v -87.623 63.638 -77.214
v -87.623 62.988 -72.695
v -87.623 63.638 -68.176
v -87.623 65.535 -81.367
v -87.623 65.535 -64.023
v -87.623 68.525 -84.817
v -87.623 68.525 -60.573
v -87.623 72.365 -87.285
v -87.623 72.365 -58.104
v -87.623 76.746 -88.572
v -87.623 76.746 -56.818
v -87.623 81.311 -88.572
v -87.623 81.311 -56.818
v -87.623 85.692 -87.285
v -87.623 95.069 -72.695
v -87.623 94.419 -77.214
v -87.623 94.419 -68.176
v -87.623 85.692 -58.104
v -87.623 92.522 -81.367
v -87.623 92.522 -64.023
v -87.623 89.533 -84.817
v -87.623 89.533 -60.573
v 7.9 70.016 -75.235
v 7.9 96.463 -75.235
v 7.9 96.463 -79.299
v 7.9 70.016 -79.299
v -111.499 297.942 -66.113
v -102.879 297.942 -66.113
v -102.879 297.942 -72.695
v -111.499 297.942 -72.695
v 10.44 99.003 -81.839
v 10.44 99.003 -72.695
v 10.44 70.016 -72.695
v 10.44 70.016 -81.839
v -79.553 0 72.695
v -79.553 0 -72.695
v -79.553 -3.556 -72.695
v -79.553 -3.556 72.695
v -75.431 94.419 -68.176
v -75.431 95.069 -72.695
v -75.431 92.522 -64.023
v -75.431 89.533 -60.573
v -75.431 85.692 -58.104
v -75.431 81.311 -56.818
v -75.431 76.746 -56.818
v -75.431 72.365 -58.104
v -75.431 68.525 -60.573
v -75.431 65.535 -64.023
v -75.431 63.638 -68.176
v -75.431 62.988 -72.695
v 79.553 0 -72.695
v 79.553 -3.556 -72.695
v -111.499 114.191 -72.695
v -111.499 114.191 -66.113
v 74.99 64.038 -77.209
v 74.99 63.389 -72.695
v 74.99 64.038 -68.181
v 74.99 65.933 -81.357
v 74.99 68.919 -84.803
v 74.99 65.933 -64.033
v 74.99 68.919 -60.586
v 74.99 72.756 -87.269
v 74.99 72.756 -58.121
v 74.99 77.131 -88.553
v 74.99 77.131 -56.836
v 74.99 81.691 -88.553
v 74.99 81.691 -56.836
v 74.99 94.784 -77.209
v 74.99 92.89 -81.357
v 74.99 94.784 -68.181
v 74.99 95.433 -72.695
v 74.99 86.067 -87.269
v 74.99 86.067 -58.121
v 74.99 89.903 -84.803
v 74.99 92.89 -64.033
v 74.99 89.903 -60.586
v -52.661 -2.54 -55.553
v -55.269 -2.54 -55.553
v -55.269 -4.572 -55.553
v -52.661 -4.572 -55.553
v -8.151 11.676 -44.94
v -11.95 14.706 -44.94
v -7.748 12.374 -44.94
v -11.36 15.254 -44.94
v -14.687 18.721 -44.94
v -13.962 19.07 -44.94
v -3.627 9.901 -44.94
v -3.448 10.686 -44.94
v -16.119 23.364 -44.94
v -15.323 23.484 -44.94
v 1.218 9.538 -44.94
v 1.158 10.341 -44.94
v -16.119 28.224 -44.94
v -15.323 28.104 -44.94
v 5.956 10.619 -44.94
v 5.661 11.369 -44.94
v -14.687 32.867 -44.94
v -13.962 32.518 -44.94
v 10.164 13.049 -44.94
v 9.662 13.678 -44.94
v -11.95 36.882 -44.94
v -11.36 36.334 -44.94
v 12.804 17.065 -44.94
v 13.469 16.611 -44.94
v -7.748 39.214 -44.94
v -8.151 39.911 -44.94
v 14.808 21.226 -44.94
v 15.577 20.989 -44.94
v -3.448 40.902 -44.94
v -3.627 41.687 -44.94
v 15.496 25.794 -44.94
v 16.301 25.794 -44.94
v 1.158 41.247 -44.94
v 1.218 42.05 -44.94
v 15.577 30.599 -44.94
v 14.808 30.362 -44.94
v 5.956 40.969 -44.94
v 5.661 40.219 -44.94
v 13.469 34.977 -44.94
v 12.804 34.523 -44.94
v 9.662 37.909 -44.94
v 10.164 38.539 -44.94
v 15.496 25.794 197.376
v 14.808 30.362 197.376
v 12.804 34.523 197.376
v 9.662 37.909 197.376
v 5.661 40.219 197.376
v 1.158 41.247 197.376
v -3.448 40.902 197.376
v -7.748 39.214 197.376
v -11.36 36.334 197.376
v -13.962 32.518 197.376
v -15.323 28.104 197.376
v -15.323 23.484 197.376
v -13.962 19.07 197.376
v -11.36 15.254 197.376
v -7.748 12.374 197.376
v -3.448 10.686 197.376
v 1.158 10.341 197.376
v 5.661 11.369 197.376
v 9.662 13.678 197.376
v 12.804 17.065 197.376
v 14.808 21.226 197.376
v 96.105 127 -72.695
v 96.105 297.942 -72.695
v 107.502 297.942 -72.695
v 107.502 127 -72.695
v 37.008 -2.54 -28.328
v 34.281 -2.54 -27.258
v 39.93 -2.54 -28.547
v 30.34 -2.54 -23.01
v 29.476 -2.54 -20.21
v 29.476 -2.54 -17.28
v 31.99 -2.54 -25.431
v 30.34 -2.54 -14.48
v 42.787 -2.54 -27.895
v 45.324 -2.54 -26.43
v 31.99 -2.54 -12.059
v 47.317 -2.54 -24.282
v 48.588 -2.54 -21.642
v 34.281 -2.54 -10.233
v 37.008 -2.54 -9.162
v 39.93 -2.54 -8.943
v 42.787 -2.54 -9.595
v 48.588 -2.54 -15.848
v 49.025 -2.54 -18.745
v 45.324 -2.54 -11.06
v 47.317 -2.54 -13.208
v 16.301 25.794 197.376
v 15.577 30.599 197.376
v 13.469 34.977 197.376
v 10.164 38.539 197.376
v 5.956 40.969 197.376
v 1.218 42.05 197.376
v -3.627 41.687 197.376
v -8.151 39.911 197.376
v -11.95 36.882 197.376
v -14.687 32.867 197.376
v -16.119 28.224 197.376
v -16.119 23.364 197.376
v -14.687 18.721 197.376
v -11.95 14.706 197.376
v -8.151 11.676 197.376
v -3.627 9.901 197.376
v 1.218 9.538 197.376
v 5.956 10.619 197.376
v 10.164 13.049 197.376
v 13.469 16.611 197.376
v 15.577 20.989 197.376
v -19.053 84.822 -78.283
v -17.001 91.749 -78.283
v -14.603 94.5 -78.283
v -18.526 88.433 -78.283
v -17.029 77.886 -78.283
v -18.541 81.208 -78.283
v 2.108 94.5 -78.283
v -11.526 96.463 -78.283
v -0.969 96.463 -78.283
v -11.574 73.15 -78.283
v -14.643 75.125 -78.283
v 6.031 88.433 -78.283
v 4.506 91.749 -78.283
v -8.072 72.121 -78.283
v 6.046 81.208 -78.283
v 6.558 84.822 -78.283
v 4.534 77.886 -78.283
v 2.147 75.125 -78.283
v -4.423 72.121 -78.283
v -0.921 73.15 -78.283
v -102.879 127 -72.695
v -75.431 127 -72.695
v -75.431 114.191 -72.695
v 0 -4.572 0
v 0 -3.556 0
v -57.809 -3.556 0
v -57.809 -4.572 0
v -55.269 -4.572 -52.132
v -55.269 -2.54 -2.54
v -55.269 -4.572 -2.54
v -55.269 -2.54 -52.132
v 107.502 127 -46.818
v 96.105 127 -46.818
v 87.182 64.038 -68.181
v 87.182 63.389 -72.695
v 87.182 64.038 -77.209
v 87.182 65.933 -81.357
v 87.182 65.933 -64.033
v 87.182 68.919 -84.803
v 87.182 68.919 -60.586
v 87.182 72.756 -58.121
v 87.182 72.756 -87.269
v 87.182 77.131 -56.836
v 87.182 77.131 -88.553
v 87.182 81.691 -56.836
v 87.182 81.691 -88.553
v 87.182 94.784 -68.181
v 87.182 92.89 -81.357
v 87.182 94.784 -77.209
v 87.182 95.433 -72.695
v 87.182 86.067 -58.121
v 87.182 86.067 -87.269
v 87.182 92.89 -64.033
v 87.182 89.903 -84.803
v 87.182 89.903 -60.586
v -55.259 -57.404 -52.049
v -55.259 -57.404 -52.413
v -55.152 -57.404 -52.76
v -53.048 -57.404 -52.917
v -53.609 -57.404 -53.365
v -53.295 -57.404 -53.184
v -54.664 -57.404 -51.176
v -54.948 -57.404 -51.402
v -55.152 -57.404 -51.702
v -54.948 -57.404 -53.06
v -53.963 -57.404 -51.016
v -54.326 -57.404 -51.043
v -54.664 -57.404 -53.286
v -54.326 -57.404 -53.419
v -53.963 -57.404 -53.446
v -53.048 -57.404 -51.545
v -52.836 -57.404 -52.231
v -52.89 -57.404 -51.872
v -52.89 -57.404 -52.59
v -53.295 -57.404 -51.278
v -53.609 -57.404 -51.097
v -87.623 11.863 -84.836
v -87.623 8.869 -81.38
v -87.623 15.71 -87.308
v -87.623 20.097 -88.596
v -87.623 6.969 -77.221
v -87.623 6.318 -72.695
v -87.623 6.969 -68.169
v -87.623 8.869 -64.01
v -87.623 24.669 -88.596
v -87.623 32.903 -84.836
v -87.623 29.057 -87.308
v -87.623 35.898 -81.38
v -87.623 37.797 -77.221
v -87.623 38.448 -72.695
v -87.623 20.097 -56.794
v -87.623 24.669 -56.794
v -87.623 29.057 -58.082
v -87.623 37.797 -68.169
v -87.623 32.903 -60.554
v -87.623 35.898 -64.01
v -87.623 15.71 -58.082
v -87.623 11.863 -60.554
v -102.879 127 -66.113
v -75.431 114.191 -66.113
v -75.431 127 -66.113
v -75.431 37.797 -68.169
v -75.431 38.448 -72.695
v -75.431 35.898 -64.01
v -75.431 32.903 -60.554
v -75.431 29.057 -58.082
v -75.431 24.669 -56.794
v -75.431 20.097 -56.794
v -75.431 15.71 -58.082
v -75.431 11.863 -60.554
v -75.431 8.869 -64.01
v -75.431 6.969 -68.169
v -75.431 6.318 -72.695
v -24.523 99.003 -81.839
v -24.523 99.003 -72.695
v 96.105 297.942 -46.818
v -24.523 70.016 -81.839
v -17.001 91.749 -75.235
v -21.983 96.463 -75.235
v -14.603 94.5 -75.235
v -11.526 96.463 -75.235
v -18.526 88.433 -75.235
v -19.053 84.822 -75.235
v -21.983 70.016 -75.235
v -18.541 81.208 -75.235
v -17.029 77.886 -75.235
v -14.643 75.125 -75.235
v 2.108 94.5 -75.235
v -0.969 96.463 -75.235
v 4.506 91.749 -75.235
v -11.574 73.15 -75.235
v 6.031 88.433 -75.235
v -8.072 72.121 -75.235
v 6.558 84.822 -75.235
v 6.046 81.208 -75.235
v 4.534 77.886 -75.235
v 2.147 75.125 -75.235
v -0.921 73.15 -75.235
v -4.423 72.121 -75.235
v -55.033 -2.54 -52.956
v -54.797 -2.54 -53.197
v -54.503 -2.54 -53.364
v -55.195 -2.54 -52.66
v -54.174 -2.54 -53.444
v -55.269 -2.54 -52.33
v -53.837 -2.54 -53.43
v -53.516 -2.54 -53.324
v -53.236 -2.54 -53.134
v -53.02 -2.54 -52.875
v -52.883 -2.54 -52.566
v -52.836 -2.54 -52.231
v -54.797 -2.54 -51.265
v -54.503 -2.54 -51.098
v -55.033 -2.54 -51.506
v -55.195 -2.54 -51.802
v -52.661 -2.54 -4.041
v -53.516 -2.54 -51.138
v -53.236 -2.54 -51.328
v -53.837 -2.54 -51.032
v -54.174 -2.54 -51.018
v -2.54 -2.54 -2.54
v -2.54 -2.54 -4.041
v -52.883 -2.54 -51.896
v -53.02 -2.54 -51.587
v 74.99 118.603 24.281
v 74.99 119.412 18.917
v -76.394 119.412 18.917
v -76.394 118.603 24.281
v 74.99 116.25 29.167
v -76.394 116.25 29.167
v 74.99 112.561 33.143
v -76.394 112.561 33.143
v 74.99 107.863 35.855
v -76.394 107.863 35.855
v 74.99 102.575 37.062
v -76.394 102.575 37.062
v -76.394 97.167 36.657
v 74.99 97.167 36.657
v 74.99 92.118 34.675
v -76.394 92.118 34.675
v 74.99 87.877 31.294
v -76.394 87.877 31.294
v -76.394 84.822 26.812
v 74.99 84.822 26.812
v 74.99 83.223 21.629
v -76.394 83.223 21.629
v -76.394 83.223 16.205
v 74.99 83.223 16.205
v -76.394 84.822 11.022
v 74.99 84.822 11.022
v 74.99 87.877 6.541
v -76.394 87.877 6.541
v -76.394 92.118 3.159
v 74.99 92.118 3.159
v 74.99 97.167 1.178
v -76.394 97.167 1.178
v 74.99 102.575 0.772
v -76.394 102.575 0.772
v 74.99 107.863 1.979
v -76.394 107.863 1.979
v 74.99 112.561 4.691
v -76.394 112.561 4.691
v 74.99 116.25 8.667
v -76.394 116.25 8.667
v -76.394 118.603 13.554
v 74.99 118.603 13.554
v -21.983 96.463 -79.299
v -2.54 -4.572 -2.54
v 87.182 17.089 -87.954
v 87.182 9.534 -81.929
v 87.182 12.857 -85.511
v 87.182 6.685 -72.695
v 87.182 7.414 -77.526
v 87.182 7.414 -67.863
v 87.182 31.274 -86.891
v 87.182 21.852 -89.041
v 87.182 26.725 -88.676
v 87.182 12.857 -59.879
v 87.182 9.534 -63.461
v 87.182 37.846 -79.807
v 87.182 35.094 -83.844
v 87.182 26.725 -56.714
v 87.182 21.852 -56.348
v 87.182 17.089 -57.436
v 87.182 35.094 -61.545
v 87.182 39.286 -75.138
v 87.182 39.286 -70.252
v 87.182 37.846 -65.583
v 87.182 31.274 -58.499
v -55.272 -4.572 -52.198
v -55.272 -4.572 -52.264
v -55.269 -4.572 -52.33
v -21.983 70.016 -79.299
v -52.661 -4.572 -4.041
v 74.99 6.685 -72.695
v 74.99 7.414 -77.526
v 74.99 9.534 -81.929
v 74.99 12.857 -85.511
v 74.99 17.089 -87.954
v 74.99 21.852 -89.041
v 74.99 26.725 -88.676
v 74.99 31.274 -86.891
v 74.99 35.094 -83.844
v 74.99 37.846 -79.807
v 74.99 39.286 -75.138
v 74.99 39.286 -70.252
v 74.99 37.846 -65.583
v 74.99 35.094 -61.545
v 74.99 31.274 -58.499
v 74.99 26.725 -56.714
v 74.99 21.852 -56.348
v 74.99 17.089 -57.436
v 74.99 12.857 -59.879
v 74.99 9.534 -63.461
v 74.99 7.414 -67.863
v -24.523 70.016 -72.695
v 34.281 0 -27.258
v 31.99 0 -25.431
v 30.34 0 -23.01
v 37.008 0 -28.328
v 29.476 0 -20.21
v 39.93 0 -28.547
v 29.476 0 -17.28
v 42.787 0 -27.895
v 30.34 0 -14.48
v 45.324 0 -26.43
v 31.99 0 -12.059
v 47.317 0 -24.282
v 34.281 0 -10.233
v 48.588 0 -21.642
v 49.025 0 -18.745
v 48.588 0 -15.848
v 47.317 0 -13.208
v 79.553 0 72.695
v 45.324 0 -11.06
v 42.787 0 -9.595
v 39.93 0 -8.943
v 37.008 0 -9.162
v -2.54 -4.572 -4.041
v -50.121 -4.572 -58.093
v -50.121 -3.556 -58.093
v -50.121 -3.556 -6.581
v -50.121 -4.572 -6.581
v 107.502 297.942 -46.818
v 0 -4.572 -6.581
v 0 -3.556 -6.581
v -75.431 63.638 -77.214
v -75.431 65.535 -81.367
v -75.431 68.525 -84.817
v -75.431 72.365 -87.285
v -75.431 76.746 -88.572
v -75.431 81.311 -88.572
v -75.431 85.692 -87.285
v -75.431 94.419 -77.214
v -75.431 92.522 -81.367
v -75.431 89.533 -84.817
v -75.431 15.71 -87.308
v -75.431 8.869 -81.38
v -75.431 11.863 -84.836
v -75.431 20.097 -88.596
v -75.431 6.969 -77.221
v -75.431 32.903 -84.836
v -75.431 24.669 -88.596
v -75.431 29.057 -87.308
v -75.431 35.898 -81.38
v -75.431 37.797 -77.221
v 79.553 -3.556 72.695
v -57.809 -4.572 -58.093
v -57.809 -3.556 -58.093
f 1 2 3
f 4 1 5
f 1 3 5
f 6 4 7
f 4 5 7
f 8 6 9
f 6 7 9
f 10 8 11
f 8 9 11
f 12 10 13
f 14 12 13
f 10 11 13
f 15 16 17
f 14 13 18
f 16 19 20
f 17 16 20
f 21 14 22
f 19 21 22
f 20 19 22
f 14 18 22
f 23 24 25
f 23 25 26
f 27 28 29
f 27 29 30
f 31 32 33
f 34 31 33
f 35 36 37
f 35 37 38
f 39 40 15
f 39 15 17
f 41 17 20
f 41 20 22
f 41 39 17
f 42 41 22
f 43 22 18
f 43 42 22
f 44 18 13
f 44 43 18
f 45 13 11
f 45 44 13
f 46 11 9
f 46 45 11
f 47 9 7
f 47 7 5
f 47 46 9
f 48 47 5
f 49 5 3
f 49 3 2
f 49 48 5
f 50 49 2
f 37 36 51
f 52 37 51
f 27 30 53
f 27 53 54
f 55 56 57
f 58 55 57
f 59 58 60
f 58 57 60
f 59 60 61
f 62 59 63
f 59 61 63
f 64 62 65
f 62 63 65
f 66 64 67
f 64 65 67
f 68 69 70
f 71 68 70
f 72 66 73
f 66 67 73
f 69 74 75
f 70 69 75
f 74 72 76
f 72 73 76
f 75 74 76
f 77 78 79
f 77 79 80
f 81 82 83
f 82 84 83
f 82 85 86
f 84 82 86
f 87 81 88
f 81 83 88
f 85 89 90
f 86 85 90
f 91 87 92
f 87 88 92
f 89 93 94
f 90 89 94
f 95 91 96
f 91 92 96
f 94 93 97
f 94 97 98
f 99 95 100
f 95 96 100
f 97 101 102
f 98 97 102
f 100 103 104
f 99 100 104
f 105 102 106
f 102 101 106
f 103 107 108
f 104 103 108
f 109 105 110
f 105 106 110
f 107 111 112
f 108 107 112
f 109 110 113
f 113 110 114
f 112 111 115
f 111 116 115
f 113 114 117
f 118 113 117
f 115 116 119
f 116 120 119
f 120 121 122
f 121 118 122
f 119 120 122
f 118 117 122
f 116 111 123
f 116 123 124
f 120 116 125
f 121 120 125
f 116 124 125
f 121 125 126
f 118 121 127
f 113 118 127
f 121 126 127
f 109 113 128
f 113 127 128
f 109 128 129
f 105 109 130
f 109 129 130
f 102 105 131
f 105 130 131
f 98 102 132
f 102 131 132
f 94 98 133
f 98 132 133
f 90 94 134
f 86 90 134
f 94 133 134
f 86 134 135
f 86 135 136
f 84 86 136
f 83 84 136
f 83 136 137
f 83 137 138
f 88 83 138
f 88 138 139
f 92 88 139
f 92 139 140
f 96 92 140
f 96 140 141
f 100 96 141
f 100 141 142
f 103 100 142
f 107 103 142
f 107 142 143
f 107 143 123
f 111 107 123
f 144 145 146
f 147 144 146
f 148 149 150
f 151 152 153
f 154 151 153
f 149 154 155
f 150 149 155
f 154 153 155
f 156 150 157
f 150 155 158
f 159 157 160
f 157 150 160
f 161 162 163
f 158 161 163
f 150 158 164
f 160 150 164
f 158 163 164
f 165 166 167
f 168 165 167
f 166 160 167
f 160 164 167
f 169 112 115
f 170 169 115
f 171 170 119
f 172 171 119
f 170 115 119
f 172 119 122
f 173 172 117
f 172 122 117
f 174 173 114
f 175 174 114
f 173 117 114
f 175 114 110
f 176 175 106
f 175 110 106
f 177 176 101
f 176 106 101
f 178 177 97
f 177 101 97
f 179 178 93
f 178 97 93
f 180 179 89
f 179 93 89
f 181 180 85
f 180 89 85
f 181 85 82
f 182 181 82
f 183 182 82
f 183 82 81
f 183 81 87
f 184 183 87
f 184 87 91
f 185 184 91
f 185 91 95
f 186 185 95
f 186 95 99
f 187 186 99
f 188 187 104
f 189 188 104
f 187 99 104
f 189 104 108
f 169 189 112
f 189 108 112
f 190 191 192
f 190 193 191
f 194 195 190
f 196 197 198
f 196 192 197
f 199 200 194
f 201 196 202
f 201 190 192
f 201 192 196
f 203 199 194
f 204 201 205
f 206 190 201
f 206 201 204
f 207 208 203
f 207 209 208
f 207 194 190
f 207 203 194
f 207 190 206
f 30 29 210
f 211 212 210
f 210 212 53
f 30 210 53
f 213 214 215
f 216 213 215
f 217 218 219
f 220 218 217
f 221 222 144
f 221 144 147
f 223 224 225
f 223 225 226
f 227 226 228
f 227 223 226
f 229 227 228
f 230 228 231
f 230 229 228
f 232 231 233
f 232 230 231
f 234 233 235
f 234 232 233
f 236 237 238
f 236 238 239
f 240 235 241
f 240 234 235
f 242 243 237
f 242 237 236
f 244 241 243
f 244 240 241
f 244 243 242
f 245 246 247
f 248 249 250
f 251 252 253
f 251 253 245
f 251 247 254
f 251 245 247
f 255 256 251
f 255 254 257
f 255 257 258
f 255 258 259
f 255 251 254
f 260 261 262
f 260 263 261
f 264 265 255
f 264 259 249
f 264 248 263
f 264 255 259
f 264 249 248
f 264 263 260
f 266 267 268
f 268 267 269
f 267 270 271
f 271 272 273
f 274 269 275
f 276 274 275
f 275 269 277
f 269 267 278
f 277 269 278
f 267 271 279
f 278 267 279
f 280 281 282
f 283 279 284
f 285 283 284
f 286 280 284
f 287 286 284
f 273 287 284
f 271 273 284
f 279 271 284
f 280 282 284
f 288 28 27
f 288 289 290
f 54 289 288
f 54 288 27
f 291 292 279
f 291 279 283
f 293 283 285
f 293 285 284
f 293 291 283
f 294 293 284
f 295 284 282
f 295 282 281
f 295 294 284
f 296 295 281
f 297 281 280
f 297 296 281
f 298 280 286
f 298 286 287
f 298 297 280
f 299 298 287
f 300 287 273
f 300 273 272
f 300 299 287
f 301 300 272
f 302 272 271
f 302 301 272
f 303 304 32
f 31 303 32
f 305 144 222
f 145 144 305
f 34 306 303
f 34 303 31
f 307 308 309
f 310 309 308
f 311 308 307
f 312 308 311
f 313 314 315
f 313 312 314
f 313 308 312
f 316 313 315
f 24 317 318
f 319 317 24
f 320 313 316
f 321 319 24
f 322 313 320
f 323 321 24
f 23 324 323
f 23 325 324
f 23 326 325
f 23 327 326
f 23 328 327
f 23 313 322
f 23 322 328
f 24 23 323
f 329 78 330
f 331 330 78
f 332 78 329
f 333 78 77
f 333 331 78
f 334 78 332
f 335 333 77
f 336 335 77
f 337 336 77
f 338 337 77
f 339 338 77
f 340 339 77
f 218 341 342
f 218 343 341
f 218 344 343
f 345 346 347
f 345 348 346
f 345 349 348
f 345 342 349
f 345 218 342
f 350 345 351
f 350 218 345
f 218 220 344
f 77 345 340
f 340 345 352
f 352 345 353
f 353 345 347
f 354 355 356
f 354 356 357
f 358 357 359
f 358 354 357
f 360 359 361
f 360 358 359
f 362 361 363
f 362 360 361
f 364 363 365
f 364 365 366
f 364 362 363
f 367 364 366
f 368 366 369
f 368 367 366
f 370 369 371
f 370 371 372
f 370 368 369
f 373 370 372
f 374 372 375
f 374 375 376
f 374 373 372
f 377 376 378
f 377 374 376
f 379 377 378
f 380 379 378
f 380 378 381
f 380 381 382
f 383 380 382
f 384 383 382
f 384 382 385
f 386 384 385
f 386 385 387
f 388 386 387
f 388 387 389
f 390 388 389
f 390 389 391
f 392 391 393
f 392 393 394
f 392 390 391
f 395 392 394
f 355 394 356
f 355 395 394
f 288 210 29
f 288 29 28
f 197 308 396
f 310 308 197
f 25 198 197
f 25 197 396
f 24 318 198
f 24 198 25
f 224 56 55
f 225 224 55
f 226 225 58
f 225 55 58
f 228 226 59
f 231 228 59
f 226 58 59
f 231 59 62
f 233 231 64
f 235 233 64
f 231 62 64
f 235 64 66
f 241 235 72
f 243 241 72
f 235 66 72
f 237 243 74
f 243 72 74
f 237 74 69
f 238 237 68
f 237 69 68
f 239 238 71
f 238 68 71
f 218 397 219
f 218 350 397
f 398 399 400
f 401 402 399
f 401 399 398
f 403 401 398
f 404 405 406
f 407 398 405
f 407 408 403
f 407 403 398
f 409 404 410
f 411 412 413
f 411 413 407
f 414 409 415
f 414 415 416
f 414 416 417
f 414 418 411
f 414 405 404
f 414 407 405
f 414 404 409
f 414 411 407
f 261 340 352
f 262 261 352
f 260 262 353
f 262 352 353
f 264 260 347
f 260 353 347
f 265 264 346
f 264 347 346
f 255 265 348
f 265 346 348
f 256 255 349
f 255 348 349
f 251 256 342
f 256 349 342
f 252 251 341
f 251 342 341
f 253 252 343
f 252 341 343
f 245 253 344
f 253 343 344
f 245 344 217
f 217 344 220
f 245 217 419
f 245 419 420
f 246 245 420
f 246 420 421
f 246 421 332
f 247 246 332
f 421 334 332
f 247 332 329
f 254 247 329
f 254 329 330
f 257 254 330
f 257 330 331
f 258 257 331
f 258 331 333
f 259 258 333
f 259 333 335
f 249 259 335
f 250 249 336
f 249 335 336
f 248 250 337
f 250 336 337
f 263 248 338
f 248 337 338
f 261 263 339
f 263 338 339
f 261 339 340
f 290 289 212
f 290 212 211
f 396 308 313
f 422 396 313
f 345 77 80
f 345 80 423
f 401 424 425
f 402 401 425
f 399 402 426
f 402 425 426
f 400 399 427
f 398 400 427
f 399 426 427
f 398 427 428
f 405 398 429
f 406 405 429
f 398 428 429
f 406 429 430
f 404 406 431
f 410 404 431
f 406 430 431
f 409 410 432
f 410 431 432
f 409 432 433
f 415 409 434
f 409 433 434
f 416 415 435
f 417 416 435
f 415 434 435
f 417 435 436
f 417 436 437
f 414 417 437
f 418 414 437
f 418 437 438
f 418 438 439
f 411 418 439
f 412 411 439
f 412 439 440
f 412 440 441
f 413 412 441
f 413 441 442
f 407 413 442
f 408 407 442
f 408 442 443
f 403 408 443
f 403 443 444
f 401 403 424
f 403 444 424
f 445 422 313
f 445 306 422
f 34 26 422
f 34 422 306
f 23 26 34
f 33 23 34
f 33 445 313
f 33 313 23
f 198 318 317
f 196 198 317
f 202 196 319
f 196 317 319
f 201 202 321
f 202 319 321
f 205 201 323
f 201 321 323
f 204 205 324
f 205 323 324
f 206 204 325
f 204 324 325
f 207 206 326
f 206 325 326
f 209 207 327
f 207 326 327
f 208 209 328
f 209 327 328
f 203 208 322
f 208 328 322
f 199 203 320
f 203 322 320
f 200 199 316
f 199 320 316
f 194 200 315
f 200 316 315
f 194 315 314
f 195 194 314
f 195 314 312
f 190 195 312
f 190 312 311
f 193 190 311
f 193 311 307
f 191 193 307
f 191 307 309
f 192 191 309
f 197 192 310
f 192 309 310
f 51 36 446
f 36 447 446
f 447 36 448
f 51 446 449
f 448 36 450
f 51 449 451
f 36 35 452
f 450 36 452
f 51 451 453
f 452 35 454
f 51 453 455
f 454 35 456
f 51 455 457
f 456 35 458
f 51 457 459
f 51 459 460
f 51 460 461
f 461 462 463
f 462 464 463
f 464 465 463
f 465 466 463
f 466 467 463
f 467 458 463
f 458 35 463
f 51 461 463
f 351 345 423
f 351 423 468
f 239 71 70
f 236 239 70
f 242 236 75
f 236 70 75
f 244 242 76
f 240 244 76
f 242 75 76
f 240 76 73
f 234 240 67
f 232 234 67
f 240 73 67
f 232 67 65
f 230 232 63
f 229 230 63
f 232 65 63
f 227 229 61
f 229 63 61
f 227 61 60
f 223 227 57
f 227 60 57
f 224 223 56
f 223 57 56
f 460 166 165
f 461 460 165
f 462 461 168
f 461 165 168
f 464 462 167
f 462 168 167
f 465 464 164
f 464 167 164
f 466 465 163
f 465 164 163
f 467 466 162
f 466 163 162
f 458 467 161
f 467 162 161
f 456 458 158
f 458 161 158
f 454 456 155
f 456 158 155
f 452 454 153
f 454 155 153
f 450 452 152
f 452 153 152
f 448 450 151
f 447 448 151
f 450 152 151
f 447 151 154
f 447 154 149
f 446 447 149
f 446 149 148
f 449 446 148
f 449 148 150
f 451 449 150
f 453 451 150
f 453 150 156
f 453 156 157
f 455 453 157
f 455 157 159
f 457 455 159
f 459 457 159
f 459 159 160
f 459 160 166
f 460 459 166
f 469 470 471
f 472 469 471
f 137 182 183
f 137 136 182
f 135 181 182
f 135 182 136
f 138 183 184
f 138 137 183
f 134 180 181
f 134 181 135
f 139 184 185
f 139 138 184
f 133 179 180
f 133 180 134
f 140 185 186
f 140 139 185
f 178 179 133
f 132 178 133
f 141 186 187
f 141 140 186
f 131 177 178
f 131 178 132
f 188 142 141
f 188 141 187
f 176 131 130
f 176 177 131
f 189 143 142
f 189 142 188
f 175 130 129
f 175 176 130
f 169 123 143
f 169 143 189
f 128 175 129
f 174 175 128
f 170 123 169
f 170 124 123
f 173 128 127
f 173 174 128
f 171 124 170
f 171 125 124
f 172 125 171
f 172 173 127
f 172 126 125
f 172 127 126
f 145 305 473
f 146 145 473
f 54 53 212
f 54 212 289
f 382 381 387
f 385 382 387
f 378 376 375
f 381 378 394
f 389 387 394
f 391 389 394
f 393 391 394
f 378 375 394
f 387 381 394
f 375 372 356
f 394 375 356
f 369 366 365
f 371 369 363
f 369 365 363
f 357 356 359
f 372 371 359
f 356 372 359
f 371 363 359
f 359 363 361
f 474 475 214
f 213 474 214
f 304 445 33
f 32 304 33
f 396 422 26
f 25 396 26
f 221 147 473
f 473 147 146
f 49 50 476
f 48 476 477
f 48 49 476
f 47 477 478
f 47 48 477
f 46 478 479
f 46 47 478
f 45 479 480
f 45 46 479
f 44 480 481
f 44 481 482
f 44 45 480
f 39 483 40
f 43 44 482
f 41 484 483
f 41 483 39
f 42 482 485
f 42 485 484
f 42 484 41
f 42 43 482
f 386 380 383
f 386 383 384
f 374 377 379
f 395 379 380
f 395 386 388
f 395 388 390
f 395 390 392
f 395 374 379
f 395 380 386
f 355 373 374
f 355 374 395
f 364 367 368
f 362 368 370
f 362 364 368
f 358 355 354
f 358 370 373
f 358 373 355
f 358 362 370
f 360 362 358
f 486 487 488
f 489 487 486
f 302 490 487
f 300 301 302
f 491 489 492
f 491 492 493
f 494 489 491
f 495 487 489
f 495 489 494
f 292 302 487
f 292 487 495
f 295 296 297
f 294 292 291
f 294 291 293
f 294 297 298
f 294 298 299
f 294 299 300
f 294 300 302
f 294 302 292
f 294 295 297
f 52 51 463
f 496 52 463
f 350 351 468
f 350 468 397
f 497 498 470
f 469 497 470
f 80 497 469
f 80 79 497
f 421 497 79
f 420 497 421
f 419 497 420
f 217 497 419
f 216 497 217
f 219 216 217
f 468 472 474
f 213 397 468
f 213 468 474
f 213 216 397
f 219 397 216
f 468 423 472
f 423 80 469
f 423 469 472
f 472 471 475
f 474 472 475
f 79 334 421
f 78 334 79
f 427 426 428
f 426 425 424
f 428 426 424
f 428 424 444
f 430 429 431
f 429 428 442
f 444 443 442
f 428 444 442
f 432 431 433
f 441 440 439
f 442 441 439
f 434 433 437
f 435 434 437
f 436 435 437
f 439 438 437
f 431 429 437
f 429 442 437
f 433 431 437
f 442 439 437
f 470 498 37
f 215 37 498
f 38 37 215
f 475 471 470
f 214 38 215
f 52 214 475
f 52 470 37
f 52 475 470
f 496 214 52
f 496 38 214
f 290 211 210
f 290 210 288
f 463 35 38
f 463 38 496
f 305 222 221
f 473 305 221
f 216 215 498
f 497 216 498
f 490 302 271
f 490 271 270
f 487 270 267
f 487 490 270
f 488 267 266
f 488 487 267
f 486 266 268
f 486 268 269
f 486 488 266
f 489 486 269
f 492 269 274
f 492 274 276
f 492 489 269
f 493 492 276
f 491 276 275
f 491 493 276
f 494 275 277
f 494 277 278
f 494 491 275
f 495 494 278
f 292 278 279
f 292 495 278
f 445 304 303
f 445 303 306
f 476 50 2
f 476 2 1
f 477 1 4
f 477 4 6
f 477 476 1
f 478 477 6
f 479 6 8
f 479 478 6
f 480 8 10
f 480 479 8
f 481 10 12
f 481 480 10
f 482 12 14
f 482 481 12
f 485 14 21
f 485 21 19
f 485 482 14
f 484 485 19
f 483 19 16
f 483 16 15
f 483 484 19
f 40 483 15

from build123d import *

# Parameters (mm, degrees)
F0_W      = 159.1055989265
F0_H      = 145.3896015882
F1_DEPTH  = 3.556
F6_R      = 18.1959049568
F7_DEPTH  = 151.384
F13_W     = 12.8093321323
F13_H     = 6.5816342831
F14_DEPTH = 36.068
F15_W     = 8.6199865751
F15_H     = 6.5816342831
F16_DEPTH = 170.942
F18_R     = 9.8295044078
F19_DEPTH = 25.4
F20_R     = 9.9402572171
F21_DEPTH = 1.016
F24_W     = 11.3966075535
F24_H     = 6.826877594
F25_DEPTH = 170.942
F26_R     = 16.3014838399
F27_DEPTH = 242.316
F28_R     = 15.4963138216
F29_DEPTH = 245.872
F31_DEPTH = 12.192
F33_DEPTH = 12.192
F34_W     = 34.9631672725
F34_H     = 28.9866179228
F35_DEPTH = 9.144
F36_T     = -2.54
F37_R     = 12.8059007853
F38_DEPTH = 3.048
F39_W     = 11.3966075535
F39_H     = 170.942
F40_DEPTH = 19.05
F43_W     = 50.1206144691
F43_H     = 6.5812724642
F44_DEPTH = 1.016
F45_T     = -2.54
F46_R     = 1.2184903026
F47_DEPTH = 54.864


# Not quite as in the source:
# - the program builds the solid bodies; features that only make, move or delete a surface that nothing else refers to are left out


with BuildPart() as f1:
    # F0 (on Front) → F1 (new body)
    with BuildSketch(Plane.XZ):
        Rectangle(F0_W, F0_H)
    extrude(amount=F1_DEPTH)

    # F18 (on face) → F19 (cut)
    with BuildSketch(Plane.XZ.offset(3.556)):
        with Locations((39.1956530511, -18.7452007085)):
            Circle(F18_R)
    extrude(amount=-F19_DEPTH, mode=Mode.SUBTRACT)

    # F20 (on face) → F21 (join)
    with BuildSketch(Plane.XZ.offset(3.556)):
        with Locations((39.1956530511, -18.7452007085)):
            Circle(F20_R)
    extrude(amount=-F21_DEPTH)

    # F43 (on face) → F44 (join)
    with BuildSketch(Plane.XZ.offset(3.556)):
        Polygon((-57.8088574111, 0), (-57.8088574111, -58.0925121903), (-50.1206144691, -58.0925121903), (-50.1206144691, -6.5812724642), (-50.1206144691, 0), align=None)
        with Locations((-25.0603072345, -3.2906362321)):
            Rectangle(F43_W, F43_H)
    extrude(amount=F44_DEPTH)

    # F45
    f45_openings = [f1.faces().sort_by_distance(p)[0] for p in [
        (-56.989309, -4.572, -29.046256),
    ]]
    offset(amount=F45_T, openings=f45_openings, kind=Kind.INTERSECTION)

    # F46 (on face) → F47 (join)
    with BuildSketch(Plane.XZ.offset(2.54)):
        with Locations((-54.0543831885, -52.2309578955)):
            Circle(F46_R)
    extrude(amount=F47_DEPTH)


with BuildPart() as f7:
    # F6 (on face) → F7 (new body)
    with BuildSketch(Plane.YZ.offset(74.9896243215)):
        with Locations((101.2156382203, 18.9172420651)):
            Circle(F6_R)
    extrude(amount=-F7_DEPTH)


with BuildPart() as f14:
    # F13 (on face) → F14 (new body)
    with BuildSketch(Plane.YZ.offset(-75.4310935736)):
        with Locations((120.5953339338, -69.4039836526)):
            Rectangle(F13_W, F13_H)
    extrude(amount=-F14_DEPTH)

    # F15 (on face) → F16 (join)
    with BuildSketch(Plane(origin=(0, 127, 0), x_dir=(-1, 0, 0), z_dir=(0, 1, 0))):
        with Locations((107.189100286, -69.4039836526)):
            Rectangle(F15_W, F15_H)
    extrude(amount=F16_DEPTH)


with BuildPart() as f25:
    # F24 (on face) → F25 (new body)
    with BuildSketch(Plane.XZ.offset(-127)):
        with Locations((101.8033205447, -69.2813619971)):
            Rectangle(F24_W, F24_H)
    extrude(amount=-F25_DEPTH)

    # F39 (on face) → F40 (join)
    with BuildSketch(Plane.XY.offset(-65.8679232001)):
        with Locations((101.8033205447, 212.471)):
            Rectangle(F39_W, F39_H)
    extrude(amount=F40_DEPTH)


with BuildPart() as f27:
    # F26 (on face) → F27 (new body)
    with BuildSketch(Plane.XY.offset(-44.9399761856)):
        with Locations((0, 25.7939305156)):
            Circle(F26_R)
    extrude(amount=F27_DEPTH)

    # F28 (on face) → F29 (cut)
    with BuildSketch(Plane.XY.offset(197.3760238144)):
        with Locations((0, 25.7939305156)):
            Circle(F28_R)
    extrude(amount=-F29_DEPTH, mode=Mode.SUBTRACT)


with BuildPart() as f31:
    # F30 (on face) → F31 (new body)
    with BuildSketch(Plane.YZ.offset(-75.4310935736)):
        with BuildLine():
            ThreePointArc((95.0685632255, -72.6948007941), (79.0285095572, -56.6547471259), (62.988455889, -72.6948007941))
            Line((62.988455889, -72.6948007941), (95.0685632255, -72.6948007941))
        make_face()
        with BuildLine():
            Line((95.0685632255, -72.6948007941), (62.988455889, -72.6948007941))
            ThreePointArc((62.988455889, -72.6948007941), (79.0285095572, -88.7348544623), (95.0685632255, -72.6948007941))
        make_face()
    extrude(amount=-F31_DEPTH)


with BuildPart() as f31b:
    # F30 (on face) → F31, piece 2 (new body)
    with BuildSketch(Plane.YZ.offset(-75.4310935736)):
        with BuildLine():
            Line((6.31843889, -72.6948007941), (38.4480318999, -72.6948007941))
            ThreePointArc((38.4480318999, -72.6948007941), (22.383235395, -56.6300042891), (6.31843889, -72.6948007941))
        make_face()
        with BuildLine():
            ThreePointArc((6.31843889, -72.6948007941), (22.383235395, -88.7595972991), (38.4480318999, -72.6948007941))
            Line((38.4480318999, -72.6948007941), (6.31843889, -72.6948007941))
        make_face()
    extrude(amount=-F31_DEPTH)


with BuildPart() as f33:
    # F32 (on face) → F33 (new body)
    with BuildSketch(Plane.YZ.offset(74.9896243215)):
        with BuildLine():
            Line((6.6852848444, -72.6948007941), (39.4695830132, -72.6948007941))
            ThreePointArc((39.4695830132, -72.6948007941), (23.0774339288, -56.3026517097), (6.6852848444, -72.6948007941))
        make_face()
        with BuildLine():
            ThreePointArc((6.6852848444, -72.6948007941), (23.0774339288, -89.0869498785), (39.4695830132, -72.6948007941))
            Line((39.4695830132, -72.6948007941), (6.6852848444, -72.6948007941))
        make_face()
    extrude(amount=F33_DEPTH)


with BuildPart() as f33b:
    # F32 (on face) → F33, piece 2 (new body)
    with BuildSketch(Plane.YZ.offset(74.9896243215)):
        with BuildLine():
            Line((95.4328895507, -72.6948007941), (63.3894979062, -72.6948007941))
            ThreePointArc((63.3894979062, -72.6948007941), (79.4111937284, -88.7164966163), (95.4328895507, -72.6948007941))
        make_face()
        with BuildLine():
            ThreePointArc((95.4328895507, -72.6948007941), (79.4111937284, -56.6731049719), (63.3894979062, -72.6948007941))
            Line((63.3894979062, -72.6948007941), (95.4328895507, -72.6948007941))
        make_face()
    extrude(amount=F33_DEPTH)


with BuildPart() as f35:
    # F34 (on face) → F35 (new body)
    with BuildSketch(Plane(origin=(0, 0, -72.6948007941), x_dir=(1, 0, 0), z_dir=(0, 0, -1))):
        with Locations((-7.0415311493, -84.5097303391)):
            Rectangle(F34_W, F34_H)
    extrude(amount=F35_DEPTH)

    # F36
    f36_openings = [f35.faces().sort_by_distance(p)[0] for p in [
        (-7.041531, 70.016421, -77.266801),
    ]]
    offset(amount=F36_T, openings=f36_openings)

    # F37 (on face) → F38 (join)
    with BuildSketch(Plane(origin=(0, 0, -75.2348007941), x_dir=(1, 0, 0), z_dir=(0, 0, -1))):
        with Locations((-6.2475237064, -84.7957953811)):
            Circle(F37_R)
    extrude(amount=F38_DEPTH)


solid = Compound([f1.part, f7.part, f14.part, f25.part, f27.part, f31.part, f31b.part, f33.part, f33b.part, f35.part])
